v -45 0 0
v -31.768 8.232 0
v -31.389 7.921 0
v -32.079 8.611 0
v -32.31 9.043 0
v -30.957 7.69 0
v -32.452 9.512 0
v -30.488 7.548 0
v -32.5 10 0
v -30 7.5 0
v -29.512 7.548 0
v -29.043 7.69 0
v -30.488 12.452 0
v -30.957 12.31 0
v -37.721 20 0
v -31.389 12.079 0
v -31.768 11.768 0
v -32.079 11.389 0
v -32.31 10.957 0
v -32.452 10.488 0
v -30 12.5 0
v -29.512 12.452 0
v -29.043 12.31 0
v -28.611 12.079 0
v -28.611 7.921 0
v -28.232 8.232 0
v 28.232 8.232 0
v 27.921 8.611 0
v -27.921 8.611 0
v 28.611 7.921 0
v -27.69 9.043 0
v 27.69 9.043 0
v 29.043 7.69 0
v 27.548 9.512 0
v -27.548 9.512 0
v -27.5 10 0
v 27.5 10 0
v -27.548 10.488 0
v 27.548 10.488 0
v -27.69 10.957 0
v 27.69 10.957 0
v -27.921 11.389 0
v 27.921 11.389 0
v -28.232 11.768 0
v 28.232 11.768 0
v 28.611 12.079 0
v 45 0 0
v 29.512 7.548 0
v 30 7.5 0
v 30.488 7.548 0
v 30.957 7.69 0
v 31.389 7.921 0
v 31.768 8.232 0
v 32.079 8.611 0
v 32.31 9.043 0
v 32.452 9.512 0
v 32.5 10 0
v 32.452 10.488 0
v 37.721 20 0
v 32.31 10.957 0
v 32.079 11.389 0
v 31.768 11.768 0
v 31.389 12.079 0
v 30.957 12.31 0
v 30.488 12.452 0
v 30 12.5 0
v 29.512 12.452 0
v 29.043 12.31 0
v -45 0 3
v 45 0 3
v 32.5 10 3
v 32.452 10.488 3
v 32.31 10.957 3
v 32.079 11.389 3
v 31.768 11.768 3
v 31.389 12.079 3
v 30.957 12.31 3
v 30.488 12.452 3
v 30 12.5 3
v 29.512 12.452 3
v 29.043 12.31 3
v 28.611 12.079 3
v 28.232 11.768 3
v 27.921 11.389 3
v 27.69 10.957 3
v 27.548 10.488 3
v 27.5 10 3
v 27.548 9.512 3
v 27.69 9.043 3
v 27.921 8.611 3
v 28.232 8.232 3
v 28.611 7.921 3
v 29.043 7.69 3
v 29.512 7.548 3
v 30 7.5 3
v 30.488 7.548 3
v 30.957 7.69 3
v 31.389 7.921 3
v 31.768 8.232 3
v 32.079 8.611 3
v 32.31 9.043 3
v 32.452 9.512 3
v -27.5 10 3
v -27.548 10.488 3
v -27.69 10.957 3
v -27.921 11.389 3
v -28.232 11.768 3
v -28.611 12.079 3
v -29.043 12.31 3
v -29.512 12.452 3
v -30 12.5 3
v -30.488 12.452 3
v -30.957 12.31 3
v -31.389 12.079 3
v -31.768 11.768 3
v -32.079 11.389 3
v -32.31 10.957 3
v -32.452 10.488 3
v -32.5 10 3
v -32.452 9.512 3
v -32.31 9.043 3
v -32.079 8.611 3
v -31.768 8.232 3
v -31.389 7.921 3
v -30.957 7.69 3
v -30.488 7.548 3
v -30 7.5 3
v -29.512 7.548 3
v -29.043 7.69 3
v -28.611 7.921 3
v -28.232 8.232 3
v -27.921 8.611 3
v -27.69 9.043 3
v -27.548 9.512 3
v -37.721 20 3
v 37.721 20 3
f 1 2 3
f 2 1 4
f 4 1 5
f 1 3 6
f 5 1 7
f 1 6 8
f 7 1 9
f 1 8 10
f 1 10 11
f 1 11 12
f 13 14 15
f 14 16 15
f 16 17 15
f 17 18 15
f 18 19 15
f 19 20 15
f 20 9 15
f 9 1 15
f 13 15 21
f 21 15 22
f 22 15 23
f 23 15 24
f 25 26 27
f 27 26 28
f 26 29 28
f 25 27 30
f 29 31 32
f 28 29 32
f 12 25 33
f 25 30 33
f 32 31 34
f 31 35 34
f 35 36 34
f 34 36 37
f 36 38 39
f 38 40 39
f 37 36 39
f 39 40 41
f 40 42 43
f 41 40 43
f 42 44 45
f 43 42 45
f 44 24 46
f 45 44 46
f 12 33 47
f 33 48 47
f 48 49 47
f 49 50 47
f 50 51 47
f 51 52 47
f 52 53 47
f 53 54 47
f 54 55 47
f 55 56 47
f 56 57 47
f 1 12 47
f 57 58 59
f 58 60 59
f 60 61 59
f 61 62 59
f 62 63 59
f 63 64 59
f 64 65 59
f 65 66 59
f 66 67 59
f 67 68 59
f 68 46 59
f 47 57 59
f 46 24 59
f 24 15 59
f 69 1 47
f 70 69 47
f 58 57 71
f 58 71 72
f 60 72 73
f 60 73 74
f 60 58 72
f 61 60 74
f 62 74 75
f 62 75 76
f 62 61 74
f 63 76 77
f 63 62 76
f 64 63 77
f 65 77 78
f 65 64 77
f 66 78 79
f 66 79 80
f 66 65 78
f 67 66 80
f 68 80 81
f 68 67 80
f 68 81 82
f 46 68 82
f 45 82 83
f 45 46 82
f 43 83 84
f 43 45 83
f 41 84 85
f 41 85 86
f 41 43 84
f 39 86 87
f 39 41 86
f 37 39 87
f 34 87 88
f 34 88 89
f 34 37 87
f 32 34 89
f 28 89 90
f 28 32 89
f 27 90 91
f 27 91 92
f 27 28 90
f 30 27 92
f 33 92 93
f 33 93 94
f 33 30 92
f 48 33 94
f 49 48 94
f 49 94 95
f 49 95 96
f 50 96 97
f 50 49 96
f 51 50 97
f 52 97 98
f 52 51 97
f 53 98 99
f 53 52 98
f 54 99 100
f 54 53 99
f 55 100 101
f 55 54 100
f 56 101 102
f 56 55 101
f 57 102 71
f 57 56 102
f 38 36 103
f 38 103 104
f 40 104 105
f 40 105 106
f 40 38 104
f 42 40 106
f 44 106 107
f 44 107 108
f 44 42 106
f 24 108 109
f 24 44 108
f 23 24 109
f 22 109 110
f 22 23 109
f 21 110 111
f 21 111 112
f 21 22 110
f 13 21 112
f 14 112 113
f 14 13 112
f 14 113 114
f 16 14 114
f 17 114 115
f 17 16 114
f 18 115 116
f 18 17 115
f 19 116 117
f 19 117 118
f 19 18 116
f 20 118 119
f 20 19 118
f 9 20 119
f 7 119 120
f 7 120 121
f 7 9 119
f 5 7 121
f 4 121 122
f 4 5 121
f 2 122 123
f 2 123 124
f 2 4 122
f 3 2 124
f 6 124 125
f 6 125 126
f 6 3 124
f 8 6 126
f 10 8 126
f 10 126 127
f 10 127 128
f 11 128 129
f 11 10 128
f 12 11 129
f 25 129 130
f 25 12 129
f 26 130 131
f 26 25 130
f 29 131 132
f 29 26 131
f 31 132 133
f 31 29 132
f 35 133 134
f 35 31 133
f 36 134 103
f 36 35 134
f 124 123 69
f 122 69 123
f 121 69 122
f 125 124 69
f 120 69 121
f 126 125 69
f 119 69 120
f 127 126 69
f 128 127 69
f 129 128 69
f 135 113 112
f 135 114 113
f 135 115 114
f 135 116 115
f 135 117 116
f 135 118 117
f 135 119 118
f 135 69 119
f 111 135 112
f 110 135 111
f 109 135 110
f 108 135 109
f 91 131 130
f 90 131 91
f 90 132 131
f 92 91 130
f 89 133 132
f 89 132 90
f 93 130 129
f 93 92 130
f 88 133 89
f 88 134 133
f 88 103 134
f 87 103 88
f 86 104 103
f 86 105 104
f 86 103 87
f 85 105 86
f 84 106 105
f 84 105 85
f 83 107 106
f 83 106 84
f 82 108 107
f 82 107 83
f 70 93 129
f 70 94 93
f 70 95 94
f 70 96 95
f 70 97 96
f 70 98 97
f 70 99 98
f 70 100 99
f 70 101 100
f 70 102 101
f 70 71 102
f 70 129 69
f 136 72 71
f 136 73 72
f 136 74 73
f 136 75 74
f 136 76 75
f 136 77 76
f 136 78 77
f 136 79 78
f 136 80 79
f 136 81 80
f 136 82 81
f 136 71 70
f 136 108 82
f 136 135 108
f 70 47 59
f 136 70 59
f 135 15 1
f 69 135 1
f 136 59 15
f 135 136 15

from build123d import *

# Parameters (mm, degrees)
CROQUIS1_R              = 2.5
SALIENTE_EXTRUIR1_DEPTH = 3


with BuildPart() as part:
    # Croquis1 → Saliente-Extruir1 (new body)
    with BuildSketch(Plane.XY):
        Polygon((-45, 0), (45, 0), (37.720595315, 20), (-37.720595315, 20), align=None)
        with Locations((-30, 10)):
            Circle(CROQUIS1_R, mode=Mode.SUBTRACT)
        with Locations((30, 10)):
            Circle(CROQUIS1_R, mode=Mode.SUBTRACT)
    extrude(amount=SALIENTE_EXTRUIR1_DEPTH)


solid = part.part
